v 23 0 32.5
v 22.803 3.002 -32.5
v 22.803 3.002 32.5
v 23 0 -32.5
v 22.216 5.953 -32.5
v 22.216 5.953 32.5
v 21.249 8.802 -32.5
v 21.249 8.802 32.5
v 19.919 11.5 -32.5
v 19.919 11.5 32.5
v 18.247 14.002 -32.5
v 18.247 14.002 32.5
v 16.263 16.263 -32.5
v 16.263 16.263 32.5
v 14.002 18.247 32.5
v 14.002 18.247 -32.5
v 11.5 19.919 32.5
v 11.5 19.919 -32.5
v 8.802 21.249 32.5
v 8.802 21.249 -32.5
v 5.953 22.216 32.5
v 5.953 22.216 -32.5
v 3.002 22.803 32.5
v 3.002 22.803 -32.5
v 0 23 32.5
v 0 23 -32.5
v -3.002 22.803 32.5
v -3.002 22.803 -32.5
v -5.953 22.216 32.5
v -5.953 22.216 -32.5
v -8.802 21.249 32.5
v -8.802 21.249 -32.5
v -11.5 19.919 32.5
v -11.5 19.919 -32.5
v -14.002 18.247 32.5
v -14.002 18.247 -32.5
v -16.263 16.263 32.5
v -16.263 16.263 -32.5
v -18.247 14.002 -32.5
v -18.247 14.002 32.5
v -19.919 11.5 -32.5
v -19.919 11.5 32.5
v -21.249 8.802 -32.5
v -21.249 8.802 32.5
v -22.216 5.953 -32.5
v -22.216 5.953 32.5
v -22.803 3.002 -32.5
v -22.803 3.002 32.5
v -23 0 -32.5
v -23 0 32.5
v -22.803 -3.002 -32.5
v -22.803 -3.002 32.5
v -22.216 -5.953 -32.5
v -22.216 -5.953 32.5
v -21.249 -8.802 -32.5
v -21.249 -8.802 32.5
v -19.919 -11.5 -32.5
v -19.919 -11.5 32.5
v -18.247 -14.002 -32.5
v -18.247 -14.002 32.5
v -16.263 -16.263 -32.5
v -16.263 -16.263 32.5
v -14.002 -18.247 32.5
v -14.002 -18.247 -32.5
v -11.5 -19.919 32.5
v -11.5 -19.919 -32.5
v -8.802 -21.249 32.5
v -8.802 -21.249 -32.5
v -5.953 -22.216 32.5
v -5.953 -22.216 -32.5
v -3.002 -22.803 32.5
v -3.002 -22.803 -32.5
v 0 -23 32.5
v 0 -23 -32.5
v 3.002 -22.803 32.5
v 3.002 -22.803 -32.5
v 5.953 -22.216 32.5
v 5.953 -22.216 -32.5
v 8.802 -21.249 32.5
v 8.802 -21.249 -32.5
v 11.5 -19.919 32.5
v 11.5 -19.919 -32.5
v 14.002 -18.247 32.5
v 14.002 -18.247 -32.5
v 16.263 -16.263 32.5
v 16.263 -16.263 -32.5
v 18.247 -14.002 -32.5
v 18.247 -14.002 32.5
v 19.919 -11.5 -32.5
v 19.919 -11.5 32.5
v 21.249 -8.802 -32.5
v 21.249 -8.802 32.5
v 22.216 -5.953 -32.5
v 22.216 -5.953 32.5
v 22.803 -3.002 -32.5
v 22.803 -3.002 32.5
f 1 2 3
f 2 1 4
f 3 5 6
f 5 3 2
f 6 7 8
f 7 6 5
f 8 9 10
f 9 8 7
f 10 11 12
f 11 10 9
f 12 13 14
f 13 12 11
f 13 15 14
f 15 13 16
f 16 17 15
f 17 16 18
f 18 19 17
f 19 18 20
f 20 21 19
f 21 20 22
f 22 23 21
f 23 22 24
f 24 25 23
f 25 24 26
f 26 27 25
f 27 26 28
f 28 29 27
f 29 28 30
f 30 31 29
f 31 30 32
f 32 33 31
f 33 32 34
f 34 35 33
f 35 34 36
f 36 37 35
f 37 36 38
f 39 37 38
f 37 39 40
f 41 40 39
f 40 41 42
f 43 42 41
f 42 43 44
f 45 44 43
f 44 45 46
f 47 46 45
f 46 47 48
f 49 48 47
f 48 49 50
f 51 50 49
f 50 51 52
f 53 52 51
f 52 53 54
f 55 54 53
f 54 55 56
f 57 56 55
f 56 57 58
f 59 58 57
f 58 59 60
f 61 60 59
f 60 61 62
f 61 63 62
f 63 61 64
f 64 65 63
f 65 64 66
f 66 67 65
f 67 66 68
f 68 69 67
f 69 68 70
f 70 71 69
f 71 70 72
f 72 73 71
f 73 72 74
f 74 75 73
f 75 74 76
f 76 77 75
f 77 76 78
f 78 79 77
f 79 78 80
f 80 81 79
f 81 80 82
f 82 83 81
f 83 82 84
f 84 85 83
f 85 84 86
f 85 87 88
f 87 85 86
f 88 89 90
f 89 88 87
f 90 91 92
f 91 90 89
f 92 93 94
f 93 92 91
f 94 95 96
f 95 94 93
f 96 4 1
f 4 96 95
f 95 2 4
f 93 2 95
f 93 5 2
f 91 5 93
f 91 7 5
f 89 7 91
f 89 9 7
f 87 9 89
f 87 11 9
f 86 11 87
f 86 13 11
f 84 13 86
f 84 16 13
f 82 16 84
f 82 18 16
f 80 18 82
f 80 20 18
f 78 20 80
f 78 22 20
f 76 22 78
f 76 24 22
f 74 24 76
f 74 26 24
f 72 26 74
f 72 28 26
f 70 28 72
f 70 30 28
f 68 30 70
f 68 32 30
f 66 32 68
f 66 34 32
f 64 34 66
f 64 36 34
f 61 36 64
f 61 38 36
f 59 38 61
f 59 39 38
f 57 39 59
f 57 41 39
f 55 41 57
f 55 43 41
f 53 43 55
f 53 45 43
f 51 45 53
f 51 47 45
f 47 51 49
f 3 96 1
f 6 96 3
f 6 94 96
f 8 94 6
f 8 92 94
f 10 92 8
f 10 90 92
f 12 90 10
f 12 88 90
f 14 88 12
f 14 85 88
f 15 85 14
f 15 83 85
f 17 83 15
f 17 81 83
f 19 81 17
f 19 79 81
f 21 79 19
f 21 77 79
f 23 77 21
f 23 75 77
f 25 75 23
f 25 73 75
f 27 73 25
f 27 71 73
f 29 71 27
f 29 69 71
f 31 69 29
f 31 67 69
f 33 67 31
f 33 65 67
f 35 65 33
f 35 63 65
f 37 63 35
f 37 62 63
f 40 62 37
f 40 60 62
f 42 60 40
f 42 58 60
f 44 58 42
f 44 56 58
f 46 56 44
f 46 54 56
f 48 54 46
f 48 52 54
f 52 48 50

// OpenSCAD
// ========================================
// a cylinder with radius 2.3 cm and height 6.5 cm
// NeuroCAD canonical IR; dimensions are millimetres
// ========================================
$fn = 48;

cylinder(r=23, h=65, center=true);
